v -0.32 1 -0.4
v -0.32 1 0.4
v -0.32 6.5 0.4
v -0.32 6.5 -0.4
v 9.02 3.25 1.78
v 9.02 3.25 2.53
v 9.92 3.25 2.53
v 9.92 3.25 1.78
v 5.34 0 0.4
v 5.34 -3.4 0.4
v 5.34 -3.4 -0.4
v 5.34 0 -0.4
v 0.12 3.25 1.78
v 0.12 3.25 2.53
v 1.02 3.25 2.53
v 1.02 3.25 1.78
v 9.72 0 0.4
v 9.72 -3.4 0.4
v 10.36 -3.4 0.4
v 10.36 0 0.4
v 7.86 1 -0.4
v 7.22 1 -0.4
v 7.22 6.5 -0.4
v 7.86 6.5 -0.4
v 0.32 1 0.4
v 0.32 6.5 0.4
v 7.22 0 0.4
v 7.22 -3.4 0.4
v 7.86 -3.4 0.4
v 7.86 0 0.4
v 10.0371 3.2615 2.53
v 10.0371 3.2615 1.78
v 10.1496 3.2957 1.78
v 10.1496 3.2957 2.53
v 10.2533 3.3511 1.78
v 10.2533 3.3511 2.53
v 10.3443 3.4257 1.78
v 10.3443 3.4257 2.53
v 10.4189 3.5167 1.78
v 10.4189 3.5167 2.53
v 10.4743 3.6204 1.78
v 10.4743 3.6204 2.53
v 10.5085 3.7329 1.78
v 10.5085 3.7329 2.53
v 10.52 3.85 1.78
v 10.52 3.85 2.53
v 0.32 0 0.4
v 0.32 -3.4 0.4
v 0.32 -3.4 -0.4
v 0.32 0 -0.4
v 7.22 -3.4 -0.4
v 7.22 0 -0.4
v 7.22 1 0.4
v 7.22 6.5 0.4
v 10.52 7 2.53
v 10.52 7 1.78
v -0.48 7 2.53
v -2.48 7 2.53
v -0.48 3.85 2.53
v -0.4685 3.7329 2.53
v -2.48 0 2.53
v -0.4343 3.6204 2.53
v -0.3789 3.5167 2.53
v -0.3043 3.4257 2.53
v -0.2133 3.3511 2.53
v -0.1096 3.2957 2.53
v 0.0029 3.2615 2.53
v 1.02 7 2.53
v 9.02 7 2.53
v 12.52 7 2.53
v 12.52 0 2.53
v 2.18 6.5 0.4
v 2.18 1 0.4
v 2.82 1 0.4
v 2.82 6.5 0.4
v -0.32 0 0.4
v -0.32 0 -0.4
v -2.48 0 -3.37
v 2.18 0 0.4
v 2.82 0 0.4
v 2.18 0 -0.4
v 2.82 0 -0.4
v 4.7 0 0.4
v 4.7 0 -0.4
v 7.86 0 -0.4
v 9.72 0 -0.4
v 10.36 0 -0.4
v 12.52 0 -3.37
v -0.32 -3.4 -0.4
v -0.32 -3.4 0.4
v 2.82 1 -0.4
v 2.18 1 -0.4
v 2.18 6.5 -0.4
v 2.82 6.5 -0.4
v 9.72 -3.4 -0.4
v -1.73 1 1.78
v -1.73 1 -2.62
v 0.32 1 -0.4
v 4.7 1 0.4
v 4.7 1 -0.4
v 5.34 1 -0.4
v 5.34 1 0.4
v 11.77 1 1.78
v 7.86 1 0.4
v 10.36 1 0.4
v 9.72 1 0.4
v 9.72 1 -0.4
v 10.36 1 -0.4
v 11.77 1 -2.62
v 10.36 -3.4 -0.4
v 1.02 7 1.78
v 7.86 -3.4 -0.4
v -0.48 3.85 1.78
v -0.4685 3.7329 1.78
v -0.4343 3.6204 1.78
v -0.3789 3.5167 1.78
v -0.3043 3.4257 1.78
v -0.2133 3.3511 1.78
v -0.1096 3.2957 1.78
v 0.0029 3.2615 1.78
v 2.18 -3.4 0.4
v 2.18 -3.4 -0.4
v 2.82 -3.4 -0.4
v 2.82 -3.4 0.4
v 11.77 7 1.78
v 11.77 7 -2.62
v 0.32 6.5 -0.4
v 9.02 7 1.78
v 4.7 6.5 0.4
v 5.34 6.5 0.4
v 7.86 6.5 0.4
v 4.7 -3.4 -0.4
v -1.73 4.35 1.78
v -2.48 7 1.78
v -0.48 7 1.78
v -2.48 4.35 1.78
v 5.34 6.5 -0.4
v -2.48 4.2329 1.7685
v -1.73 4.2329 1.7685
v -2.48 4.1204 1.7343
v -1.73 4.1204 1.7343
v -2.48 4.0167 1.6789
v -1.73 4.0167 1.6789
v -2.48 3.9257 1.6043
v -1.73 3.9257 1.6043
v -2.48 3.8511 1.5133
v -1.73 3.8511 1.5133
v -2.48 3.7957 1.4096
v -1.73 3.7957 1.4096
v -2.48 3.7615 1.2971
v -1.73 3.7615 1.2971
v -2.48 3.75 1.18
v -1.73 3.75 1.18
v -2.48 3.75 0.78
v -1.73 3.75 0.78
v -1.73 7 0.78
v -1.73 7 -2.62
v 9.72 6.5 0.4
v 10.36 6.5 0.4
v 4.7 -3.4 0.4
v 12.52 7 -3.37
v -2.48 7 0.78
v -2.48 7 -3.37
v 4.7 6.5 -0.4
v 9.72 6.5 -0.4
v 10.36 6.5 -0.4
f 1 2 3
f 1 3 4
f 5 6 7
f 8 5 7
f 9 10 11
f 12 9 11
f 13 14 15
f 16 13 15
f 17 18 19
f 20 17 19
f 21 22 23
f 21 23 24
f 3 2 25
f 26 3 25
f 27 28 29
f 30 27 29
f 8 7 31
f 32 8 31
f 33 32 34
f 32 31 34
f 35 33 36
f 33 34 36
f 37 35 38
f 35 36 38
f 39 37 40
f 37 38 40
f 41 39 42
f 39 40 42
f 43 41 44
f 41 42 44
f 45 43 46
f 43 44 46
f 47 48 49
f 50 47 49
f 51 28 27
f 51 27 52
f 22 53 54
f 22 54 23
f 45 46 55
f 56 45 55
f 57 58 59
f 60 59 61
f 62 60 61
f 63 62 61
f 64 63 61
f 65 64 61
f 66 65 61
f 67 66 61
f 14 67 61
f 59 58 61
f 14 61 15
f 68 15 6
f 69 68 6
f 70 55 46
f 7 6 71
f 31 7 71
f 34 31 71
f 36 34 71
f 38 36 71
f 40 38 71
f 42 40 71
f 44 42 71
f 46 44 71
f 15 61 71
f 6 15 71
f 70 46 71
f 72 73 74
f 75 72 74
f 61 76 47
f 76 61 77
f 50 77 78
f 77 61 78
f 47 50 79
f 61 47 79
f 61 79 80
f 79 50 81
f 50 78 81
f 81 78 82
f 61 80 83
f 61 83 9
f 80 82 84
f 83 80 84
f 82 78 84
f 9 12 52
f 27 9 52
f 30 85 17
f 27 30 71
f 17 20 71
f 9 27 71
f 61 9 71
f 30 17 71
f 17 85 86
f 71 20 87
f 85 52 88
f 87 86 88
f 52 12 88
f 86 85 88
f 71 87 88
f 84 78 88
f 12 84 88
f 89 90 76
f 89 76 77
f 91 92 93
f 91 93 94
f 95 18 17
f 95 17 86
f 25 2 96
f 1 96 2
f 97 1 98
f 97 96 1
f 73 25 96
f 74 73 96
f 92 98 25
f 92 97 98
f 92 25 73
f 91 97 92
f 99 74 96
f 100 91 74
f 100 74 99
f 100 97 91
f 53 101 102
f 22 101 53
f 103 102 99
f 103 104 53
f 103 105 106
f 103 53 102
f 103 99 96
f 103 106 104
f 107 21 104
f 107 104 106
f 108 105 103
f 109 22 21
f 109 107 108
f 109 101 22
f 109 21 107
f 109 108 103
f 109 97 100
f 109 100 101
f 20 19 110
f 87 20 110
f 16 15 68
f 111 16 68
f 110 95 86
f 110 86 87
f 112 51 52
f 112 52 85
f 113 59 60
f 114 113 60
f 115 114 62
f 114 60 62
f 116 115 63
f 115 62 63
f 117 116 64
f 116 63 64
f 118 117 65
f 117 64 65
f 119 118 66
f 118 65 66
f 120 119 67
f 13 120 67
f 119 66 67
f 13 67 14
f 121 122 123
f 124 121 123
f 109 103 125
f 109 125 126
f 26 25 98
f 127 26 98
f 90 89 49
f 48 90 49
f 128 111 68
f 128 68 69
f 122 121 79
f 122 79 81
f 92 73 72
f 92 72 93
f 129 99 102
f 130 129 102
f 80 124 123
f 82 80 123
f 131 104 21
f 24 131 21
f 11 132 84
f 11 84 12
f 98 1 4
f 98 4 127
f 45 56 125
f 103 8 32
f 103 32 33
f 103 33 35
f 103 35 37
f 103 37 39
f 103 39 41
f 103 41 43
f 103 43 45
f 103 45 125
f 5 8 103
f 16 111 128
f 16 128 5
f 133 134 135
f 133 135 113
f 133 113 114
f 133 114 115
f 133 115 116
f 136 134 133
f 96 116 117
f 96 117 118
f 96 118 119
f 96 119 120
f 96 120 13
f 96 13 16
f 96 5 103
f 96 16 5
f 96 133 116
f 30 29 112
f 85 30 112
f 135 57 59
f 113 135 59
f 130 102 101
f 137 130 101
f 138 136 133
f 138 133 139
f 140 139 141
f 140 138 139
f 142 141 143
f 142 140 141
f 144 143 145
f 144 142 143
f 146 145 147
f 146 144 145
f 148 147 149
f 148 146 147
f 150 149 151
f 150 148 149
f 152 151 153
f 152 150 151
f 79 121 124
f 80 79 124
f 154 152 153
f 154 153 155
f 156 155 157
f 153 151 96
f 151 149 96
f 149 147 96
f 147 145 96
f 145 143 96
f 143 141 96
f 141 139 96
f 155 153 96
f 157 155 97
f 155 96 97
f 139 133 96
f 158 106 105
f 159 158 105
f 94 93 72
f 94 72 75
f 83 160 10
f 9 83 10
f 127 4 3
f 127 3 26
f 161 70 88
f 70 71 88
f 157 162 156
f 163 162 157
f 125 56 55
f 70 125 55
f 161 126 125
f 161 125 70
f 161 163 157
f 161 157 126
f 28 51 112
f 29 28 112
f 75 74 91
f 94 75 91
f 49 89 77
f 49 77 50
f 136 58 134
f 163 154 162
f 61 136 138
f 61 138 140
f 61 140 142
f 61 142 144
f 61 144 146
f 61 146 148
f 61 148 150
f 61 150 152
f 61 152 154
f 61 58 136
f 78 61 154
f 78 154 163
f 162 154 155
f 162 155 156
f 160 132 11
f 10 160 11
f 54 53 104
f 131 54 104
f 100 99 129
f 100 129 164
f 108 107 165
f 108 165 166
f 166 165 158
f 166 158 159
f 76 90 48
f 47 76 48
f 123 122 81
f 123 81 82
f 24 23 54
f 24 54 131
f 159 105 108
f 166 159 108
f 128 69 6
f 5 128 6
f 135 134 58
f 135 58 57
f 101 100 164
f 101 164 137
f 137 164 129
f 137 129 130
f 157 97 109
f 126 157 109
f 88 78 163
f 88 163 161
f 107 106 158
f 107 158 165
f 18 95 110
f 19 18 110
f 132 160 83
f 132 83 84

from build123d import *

# Parameters (mm, degrees)
CROQUIS1_W                   = 15
CROQUIS1_H                   = 5.9
CROQUIS1_W_2                 = 0.64
CROQUIS1_H_2                 = 0.8
SALIENTE_EXTRUIR1_DEPTH      = 1
CROQUIS2_W                   = 15
CROQUIS2_H                   = 5.9
CROQUIS2_W_2                 = 13.5
CROQUIS2_H_2                 = 4.4
SALIENTE_EXTRUIR2_DEPTH      = 6
CORTAR_EXTRUIR1_DEPTH        = 9
CORTAR_EXTRUIR2_DEPTH        = 2
SALIENTE_EXTRUIR3_DEPTH      = 6.5
SALIENTE_EXTRUIR3_DEPTH_BACK = 3.4
CROQUIS5_W                   = 0.64
CROQUIS5_H                   = 0.8


with BuildPart() as part:
    # Croquis1 → Saliente-Extruir1 (new body)
    with BuildSketch(Plane(origin=(0, 0, 0), x_dir=(1, 0, 0), z_dir=(0, 1, 0))):
        with Locations((5.02, 0.42)):
            Rectangle(CROQUIS1_W, CROQUIS1_H)
        Rectangle(CROQUIS1_W_2, CROQUIS1_H_2, mode=Mode.SUBTRACT)
        with Locations((10.04, 0)):
            Rectangle(CROQUIS1_W_2, CROQUIS1_H_2, mode=Mode.SUBTRACT)
        with Locations((7.54, 0)):
            Rectangle(CROQUIS1_W_2, CROQUIS1_H_2, mode=Mode.SUBTRACT)
        with Locations((2.5, 0)):
            Rectangle(CROQUIS1_W_2, CROQUIS1_H_2, mode=Mode.SUBTRACT)
        with Locations((5.02, 0)):
            Rectangle(CROQUIS1_W_2, CROQUIS1_H_2, mode=Mode.SUBTRACT)
    extrude(amount=SALIENTE_EXTRUIR1_DEPTH)

    # Croquis2 → Saliente-Extruir2 (add)
    with BuildSketch(Plane(origin=(0, 1, 0), x_dir=(1, 0, 0), z_dir=(0, 1, 0))):
        with Locations((5.02, 0.42)):
            Rectangle(CROQUIS2_W, CROQUIS2_H)
        with Locations((5.02, 0.42)):
            Rectangle(CROQUIS2_W_2, CROQUIS2_H_2, mode=Mode.SUBTRACT)
    extrude(amount=SALIENTE_EXTRUIR2_DEPTH)

    # Croquis3 → Cortar-Extruir1 (cut)
    with BuildSketch(Plane.ZY.offset(2.48)):
        with BuildLine():
            Line((1.78, 7), (1.78, 4.35))
            ThreePointArc((1.78, 4.35), (1.604264069, 3.925735931), (1.18, 3.75))
            Line((1.18, 3.75), (0.78, 3.75))
            Line((0.78, 3.75), (0.78, 7))
            Line((0.78, 7), (1.78, 7))
        make_face()
    extrude(amount=-CORTAR_EXTRUIR1_DEPTH, mode=Mode.SUBTRACT)

    # Croquis4 → Cortar-Extruir2 (cut)
    with BuildSketch(Plane.XY.offset(2.53)):
        with BuildLine():
            Line((-0.48, 7), (-0.48, 3.85))
            ThreePointArc((-0.48, 3.85), (-0.304264069, 3.425735931), (0.12, 3.25))
            Line((0.12, 3.25), (1.02, 3.25))
            Line((1.02, 3.25), (1.02, 7))
            Line((1.02, 7), (-0.48, 7))
        make_face()
        with BuildLine():
            Line((10.52, 7), (9.02, 7))
            Line((9.02, 7), (9.02, 3.25))
            Line((9.02, 3.25), (9.92, 3.25))
            ThreePointArc((9.92, 3.25), (10.344264069, 3.425735931), (10.52, 3.85))
            Line((10.52, 3.85), (10.52, 7))
        make_face()
    extrude(amount=-CORTAR_EXTRUIR2_DEPTH, mode=Mode.SUBTRACT)

    # Croquis5 → Saliente-Extruir3 (add, two sides: drawn at the far end of the back side and taken through both)
    with BuildSketch(Plane(origin=(0, 0, 0), x_dir=(1, 0, 0), z_dir=(0, 1, 0)).offset(-SALIENTE_EXTRUIR3_DEPTH_BACK)):
        with Locations((10.04, 0)):
            Rectangle(CROQUIS5_W, CROQUIS5_H)
        Rectangle(CROQUIS5_W, CROQUIS5_H)
        with Locations((2.5, 0)):
            Rectangle(CROQUIS5_W, CROQUIS5_H)
        with Locations((7.54, 0)):
            Rectangle(CROQUIS5_W, CROQUIS5_H)
        with Locations((5.02, 0)):
            Rectangle(CROQUIS5_W, CROQUIS5_H)
    extrude(amount=SALIENTE_EXTRUIR3_DEPTH + SALIENTE_EXTRUIR3_DEPTH_BACK)


solid = part.part
